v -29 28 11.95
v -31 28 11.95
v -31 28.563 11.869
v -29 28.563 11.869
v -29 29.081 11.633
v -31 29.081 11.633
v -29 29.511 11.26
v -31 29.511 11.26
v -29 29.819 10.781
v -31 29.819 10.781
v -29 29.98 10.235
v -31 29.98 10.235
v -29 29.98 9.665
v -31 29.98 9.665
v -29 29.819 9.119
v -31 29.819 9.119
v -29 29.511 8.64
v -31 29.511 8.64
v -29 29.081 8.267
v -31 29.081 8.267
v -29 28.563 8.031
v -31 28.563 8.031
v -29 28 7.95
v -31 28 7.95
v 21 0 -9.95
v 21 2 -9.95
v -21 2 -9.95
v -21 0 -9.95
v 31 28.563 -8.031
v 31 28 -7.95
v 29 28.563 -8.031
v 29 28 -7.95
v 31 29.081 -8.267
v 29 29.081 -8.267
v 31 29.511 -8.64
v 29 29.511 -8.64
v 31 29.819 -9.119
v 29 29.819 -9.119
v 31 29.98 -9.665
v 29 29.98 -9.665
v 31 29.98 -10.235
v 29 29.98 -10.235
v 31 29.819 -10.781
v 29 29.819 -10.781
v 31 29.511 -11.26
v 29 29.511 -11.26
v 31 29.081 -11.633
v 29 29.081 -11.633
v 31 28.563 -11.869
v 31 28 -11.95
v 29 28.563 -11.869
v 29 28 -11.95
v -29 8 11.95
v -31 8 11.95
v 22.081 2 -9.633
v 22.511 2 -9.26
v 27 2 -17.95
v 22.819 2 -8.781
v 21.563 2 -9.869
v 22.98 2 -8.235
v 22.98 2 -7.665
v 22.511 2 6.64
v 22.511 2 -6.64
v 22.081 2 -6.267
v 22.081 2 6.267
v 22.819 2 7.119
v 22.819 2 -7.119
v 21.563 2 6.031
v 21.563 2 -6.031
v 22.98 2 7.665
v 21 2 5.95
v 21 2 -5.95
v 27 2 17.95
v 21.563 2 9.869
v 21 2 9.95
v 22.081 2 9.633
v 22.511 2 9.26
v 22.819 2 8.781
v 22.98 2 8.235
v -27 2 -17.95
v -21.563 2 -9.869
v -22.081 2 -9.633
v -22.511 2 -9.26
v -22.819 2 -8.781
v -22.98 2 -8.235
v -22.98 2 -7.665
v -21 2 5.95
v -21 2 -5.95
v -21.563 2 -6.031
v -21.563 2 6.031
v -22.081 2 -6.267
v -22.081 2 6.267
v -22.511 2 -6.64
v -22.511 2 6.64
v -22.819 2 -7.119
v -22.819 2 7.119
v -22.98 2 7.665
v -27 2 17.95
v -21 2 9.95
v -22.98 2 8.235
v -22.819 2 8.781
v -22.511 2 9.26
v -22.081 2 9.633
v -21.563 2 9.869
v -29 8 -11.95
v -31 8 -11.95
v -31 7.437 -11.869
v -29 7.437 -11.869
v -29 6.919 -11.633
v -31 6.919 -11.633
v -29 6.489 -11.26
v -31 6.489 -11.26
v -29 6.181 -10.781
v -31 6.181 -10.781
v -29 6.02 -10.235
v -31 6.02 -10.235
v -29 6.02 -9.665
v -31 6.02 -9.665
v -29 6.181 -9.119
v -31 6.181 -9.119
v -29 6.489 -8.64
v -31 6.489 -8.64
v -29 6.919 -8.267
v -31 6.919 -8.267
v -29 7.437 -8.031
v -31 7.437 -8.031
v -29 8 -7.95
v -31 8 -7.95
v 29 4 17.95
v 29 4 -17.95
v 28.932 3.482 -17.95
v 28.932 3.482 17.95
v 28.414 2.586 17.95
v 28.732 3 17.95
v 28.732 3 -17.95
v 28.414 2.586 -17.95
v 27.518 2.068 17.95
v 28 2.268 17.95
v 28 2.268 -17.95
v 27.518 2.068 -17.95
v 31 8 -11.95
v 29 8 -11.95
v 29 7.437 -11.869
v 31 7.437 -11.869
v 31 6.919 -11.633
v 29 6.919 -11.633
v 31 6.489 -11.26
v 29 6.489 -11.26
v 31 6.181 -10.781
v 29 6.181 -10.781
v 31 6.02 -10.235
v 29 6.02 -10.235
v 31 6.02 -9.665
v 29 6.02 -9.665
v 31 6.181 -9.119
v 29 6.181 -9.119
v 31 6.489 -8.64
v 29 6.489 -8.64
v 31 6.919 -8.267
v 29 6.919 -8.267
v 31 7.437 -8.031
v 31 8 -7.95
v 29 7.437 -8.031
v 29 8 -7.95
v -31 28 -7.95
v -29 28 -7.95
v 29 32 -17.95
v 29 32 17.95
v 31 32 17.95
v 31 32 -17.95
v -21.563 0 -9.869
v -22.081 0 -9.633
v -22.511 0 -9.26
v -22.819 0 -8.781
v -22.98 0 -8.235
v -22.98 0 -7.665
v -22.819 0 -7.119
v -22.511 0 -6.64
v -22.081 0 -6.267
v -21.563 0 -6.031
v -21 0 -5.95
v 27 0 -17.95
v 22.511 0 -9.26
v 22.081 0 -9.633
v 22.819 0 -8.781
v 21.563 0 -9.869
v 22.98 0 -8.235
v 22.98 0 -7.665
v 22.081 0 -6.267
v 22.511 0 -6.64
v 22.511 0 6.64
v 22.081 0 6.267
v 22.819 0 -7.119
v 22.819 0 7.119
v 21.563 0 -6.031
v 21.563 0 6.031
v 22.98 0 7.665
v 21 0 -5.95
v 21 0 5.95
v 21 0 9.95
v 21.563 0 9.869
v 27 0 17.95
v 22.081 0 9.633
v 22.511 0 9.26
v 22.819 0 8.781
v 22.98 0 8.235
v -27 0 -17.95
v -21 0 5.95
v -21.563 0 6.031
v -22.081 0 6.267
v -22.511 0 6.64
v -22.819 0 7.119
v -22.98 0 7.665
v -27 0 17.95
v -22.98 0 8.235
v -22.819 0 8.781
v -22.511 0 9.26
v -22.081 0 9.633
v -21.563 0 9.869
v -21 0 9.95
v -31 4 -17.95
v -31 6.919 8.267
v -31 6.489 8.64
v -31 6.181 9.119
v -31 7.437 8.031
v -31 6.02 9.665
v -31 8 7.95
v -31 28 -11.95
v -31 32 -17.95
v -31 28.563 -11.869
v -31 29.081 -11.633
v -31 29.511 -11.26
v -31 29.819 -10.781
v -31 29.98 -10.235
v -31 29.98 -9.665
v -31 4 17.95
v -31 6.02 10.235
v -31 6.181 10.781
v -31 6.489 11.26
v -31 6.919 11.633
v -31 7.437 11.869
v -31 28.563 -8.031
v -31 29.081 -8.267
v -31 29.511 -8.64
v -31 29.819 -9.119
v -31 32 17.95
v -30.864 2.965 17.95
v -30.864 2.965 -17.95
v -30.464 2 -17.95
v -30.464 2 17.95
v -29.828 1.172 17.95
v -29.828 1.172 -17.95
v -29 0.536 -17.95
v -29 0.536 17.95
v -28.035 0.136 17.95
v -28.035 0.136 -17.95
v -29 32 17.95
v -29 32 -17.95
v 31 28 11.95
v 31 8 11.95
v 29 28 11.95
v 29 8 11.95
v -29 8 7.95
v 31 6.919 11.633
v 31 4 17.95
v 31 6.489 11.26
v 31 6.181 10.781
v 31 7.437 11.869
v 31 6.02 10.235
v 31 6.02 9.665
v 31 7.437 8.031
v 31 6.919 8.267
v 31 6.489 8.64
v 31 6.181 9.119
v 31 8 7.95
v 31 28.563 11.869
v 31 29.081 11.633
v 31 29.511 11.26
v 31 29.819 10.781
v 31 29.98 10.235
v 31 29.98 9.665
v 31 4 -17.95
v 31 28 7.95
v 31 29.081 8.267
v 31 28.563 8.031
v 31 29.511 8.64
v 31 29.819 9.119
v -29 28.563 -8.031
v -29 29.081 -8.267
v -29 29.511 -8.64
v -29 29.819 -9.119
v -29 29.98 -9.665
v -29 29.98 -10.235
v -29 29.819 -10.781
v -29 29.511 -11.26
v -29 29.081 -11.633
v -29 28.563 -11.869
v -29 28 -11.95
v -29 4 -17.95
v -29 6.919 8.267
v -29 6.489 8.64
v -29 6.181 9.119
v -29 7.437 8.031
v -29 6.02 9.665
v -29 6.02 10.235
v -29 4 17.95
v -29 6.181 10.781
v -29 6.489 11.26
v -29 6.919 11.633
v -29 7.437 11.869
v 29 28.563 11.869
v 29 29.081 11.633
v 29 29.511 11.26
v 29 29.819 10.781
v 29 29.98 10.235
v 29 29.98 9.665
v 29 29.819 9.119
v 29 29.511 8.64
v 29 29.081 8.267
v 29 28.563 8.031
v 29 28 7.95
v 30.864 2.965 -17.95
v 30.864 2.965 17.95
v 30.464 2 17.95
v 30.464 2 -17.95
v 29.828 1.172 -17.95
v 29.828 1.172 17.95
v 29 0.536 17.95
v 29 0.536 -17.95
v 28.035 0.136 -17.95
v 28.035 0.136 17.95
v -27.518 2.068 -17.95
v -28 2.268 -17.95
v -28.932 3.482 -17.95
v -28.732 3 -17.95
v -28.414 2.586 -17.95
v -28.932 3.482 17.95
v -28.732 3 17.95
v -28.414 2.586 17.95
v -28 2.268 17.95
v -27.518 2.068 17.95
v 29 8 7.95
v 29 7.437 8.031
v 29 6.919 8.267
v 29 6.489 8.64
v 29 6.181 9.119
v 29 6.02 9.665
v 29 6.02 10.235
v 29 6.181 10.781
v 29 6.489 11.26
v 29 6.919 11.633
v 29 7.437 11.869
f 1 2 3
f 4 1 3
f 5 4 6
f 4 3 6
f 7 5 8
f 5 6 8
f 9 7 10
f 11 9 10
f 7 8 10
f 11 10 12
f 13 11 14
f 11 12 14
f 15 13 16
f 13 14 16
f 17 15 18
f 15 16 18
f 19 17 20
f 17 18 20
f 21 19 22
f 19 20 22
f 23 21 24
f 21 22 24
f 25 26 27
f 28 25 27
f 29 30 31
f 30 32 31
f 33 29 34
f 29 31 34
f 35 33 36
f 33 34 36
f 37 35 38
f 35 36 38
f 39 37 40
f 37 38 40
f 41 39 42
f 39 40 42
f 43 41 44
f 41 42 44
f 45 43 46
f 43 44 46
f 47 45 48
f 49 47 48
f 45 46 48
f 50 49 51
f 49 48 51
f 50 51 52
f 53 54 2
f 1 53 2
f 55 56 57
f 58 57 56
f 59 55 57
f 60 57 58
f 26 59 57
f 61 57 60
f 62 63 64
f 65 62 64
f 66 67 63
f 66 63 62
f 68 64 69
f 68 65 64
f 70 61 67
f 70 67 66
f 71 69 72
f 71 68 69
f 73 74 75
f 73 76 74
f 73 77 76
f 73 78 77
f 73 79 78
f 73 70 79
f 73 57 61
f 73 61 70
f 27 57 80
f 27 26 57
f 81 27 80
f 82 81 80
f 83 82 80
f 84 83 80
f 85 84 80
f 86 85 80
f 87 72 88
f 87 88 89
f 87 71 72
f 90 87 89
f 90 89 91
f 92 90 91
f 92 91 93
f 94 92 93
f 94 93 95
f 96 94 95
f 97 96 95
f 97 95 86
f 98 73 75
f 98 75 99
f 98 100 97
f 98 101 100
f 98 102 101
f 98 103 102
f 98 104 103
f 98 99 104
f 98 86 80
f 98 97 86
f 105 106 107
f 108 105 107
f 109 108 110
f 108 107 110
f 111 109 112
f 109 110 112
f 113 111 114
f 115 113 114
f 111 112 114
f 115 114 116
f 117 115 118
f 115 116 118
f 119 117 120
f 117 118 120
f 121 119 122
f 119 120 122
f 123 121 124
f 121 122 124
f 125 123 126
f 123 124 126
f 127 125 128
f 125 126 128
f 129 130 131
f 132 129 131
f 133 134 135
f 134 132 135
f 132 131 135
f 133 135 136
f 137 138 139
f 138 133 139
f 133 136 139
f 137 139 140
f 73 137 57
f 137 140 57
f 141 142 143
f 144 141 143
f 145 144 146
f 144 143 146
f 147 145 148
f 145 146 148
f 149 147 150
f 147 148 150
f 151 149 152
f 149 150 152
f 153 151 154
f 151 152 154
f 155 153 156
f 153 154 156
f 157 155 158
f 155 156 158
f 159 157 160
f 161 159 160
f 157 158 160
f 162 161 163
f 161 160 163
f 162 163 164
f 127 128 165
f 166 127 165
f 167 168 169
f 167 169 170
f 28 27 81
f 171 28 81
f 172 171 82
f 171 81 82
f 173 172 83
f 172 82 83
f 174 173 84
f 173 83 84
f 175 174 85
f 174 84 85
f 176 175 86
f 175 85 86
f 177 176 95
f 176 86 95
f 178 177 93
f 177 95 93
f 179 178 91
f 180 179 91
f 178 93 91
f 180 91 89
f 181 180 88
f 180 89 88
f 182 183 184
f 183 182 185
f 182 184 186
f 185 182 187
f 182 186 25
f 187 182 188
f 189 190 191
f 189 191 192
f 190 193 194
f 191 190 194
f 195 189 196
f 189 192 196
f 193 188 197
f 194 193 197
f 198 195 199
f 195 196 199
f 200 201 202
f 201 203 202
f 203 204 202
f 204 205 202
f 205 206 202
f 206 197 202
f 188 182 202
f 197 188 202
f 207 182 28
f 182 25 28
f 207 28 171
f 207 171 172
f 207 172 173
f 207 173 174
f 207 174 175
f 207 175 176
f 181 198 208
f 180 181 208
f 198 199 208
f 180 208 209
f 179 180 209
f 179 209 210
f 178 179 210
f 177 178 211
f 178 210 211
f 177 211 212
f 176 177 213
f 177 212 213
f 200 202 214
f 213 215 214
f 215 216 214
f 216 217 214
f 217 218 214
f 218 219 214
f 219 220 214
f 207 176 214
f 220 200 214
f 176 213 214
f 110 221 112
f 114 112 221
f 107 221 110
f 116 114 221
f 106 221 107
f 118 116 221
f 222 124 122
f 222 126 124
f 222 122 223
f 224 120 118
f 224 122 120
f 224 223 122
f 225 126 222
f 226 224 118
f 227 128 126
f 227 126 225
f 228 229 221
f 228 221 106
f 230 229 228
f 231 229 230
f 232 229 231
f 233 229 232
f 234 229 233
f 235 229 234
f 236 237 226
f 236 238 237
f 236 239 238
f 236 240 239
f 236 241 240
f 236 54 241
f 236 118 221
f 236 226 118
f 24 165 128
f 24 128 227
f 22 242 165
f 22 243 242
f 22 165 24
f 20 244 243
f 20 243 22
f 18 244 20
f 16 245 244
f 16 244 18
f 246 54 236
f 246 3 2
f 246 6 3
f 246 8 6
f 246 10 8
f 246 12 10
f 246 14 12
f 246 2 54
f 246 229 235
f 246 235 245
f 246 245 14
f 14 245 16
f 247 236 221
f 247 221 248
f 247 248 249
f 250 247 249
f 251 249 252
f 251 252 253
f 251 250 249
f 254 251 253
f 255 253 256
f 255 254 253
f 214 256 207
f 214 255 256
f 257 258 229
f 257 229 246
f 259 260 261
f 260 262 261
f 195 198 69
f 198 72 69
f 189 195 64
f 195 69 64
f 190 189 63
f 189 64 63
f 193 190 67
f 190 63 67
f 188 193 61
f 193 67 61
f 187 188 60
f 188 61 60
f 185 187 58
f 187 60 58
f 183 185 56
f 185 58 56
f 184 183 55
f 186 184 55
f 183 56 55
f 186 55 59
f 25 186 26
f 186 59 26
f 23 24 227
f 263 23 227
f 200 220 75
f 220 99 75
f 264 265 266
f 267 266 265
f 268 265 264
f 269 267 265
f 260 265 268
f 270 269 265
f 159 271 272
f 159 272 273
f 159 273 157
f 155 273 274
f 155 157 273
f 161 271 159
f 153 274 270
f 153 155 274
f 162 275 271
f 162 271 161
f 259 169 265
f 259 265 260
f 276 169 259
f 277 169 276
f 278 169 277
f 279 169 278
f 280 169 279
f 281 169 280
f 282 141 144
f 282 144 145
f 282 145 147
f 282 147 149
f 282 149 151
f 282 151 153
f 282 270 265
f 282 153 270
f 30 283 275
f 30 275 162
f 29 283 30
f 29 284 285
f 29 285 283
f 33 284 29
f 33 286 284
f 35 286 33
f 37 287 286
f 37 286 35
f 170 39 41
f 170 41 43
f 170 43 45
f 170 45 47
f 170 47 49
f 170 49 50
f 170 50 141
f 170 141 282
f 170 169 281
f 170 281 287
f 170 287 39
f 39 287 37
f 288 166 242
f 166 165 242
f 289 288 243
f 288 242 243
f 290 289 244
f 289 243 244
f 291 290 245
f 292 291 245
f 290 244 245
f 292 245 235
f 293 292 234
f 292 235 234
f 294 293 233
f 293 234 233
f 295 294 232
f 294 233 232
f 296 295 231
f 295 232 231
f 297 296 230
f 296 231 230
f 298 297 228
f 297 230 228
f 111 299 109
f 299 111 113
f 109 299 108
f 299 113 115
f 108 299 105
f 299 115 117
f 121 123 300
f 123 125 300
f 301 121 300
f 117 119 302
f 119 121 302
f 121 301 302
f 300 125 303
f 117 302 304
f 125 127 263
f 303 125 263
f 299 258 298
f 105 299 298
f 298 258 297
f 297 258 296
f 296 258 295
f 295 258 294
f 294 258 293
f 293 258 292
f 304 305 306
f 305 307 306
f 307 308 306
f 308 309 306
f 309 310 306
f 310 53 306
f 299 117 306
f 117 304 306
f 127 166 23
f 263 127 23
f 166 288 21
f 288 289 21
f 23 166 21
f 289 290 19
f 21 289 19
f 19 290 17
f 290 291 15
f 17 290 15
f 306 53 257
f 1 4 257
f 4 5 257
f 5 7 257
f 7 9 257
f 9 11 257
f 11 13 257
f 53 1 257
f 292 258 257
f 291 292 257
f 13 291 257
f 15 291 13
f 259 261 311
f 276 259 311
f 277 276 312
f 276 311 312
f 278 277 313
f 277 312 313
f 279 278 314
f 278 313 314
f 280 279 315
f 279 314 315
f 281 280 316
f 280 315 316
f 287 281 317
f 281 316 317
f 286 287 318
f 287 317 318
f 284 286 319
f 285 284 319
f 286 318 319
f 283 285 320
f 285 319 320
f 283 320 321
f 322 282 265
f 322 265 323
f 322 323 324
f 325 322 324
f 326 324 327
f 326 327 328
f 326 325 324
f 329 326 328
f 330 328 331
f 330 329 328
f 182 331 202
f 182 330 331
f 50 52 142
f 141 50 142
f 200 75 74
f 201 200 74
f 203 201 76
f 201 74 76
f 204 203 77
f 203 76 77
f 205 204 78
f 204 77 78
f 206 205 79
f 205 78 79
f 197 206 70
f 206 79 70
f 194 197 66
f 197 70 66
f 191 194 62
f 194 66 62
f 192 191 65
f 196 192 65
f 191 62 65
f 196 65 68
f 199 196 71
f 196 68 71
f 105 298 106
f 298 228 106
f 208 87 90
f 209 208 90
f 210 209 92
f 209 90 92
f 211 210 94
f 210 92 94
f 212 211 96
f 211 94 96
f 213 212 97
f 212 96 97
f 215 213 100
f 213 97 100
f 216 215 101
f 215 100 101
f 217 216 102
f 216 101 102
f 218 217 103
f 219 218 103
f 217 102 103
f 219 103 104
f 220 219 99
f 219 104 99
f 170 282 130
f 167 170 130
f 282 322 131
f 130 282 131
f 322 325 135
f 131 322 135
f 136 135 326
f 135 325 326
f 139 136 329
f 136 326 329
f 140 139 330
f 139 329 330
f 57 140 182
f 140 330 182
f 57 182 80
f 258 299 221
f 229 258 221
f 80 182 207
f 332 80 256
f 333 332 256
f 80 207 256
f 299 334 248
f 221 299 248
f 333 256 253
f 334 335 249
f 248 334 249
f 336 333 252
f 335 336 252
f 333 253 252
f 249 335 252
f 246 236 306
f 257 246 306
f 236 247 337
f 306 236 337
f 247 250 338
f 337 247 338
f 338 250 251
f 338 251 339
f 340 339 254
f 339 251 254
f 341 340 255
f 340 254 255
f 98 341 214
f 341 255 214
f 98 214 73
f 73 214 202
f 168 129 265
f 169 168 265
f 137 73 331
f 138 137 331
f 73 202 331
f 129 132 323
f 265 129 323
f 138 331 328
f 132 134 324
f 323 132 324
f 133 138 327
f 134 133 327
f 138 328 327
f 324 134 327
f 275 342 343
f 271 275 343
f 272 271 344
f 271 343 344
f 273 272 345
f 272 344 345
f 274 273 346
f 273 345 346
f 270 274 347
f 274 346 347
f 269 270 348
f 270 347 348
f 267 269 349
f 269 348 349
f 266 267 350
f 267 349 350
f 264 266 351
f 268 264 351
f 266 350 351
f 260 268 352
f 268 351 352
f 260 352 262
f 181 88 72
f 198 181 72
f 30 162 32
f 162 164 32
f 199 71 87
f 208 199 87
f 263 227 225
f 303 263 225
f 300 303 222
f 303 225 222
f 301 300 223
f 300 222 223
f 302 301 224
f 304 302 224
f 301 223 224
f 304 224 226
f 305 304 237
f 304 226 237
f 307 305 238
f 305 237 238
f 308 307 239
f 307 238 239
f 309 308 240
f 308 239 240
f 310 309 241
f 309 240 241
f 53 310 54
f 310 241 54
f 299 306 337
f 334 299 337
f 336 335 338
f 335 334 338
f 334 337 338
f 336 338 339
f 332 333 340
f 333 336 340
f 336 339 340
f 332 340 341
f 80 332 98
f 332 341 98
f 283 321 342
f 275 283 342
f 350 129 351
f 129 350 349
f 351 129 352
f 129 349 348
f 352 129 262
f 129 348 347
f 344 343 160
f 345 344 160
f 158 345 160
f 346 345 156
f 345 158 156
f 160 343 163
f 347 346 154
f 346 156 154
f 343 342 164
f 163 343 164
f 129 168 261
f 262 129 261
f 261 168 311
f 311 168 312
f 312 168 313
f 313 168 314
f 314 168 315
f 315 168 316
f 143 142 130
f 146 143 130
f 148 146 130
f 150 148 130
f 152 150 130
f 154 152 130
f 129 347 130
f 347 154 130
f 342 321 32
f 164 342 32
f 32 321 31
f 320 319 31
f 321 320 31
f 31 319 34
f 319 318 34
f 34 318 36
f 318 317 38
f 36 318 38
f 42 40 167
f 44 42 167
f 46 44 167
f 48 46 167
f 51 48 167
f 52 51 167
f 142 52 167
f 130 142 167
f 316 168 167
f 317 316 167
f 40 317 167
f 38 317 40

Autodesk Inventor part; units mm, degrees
ref_plane "YZ Plane" through (0, 0, 0) normal (1, 0, 0) x (0, 1, 0)
ref_plane "XZ Plane" through (0, 0, 0) normal (0, 1, 0) x (-1, 0, 0)
ref_plane "XY Plane" through (0, 0, 0) normal (0, 0, 1) x (1, 0, 0)
sketch "スケッチ1" plane through (0, 0, 0) normal (0, 1, 0) x (-1, 0, 0)
  line L0 (-29, -17.95) -> (29, -17.95)
  line L1 (29, -17.95) -> (29, 17.95)
  line L2 (29, 17.95) -> (-29, 17.95)
  line L3 (-29, 17.95) -> (-29, -17.95)
  line L4 (-29, -17.95) -> (29, 17.95) construction
  line L5 (29, -17.95) -> (-29, 17.95) construction
  point P0 (0, 0)
  dimension "d0" = 35.9
  dimension "d1" = 58
extrude "プレート1" add sketch "スケッチ1" along normal blind 2
sketch "スケッチ2" plane through (29, 0, 17.95) normal (1, 0, 0) x (0, 0, -1)
  line L0 (0, 2) -> (35.9, 2)
  line L1 (35.9, 2) -> (0, 2)
  line L2 (0, 2) -> (0, 32)
  line L3 (0, 32) -> (35.9, 32)
  line L4 (35.9, 32) -> (35.9, 2)
  point P0 (17.95, 0)
  dimension "d3" = 30
sheet face with bend "面2" sketch "スケッチ2" thickness 2 toward (1, 0, 0) bend radius 2
bend "曲げ1"
sketch "スケッチ3" plane through (-29, 0, -17.95) normal (-1, 0, 0) x (0, 0, 1)
  line L0 (0, 0) -> (0, 2)
  line L1 (0, 32) -> (35.9, 32)
  line L2 (0, 2) -> (35.9, 2)
  line L3 (35.9, 2) -> (35.9, 32)
  line L4 (35.9, 32) -> (0, 32)
  line L5 (0, 32) -> (0, 2)
  point P0 (17.95, 0)
sheet face with bend "面3" sketch "スケッチ3" thickness 2 toward (-1, 0, 0) bend radius 2
bend "曲げ2"
sketch "スケッチ4" plane through (-31, 0, -17.95) normal (-1, 0, 0) x (0, 0, 1)
  line L0 (6, 28) -> (6, 8)
  arc A0 (6, 8) -> (10, 8) centre (8, 8) ccw
  line L1 (10, 8) -> (10, 28)
  arc A1 (10, 28) -> (6, 28) centre (8, 28) ccw
  line L2 (0, 32) -> (35.9, 32) projected
  line L3 (35.9, 4) -> (0, 4) projected
  line L4 (0, 4) -> (0, 32) projected
  line L5 (25.9, 28) -> (25.9, 8)
  arc A2 (25.9, 8) -> (29.9, 8) centre (27.9, 8) ccw
  line L6 (29.9, 8) -> (29.9, 28)
  arc A3 (29.9, 28) -> (25.9, 28) centre (27.9, 28) ccw
  line L7 (35.9, 32) -> (35.9, 4) projected
  point P0 (17.95, 0)
  dimension "d14" = 2
  dimension "d15" = 4
  dimension "d16" = 4
  dimension "d17" = 6
  dimension "d18" = 2
  dimension "d19" = 6
extrude "押し出し1" cut sketch "スケッチ4" against normal blind 100 contours A1 L1 A0 L0 | A3 L6 A2 L5
sketch "スケッチ5" plane through (0, 2, 0) normal (0, 1, 0) x (1, 0, 0)
  line L0 (-21, -9.95) -> (21, -9.95)
  arc A0 (21, -9.95) -> (21, -5.95) centre (21, -7.95) ccw
  line L1 (21, -5.95) -> (-21, -5.95)
  arc A1 (-21, -5.95) -> (-21, -9.95) centre (-21, -7.95) ccw
  line L2 (-21, 5.95) -> (21, 5.95)
  arc A2 (21, 5.95) -> (21, 9.95) centre (21, 7.95) ccw
  line L3 (21, 9.95) -> (-21, 9.95)
  arc A3 (-21, 9.95) -> (-21, 5.95) centre (-21, 7.95) ccw
  line L4 (-27, 17.95) -> (27, 17.95) projected
  line L5 (27, -17.95) -> (-27, -17.95) projected
  line L6 (-27, 17.95) -> (-27, -17.95) projected
  line L7 (27, -17.95) -> (27, 17.95) projected
  point P0 (0, 0)
  dimension "d22" = 2
  dimension "d23" = 2
  dimension "d25" = 10
  dimension "d26" = 10
  dimension "d27" = 6
  dimension "d28" = 6
  dimension "d29" = 6
  dimension "d30" = 6
extrude "押し出し2" cut sketch "スケッチ5" against normal blind 3 contours A1 L1 A0 L0 | A3 L3 A2 L2
equation "\"d2\" = Thickness"
equation "\"d4\" = BendRadius"
equation "\"d5\" = BendReliefWidth"
equation "\"d7\" = MinimumRemnant"
equation "\"d6\" = BendReliefDepth"
equation "\"d8\" = TransitionRadius"
equation "\"d9\" = BendRadius"
equation "\"d10\" = BendReliefWidth"
equation "\"d12\" = MinimumRemnant"
equation "\"d11\" = BendReliefDepth"
equation "\"d13\" = TransitionRadius"
equation "\"BendRadius\" = Thickness"
equation "\"BendReliefWidth\" = Thickness"
equation "\"BendReliefDepth\" = 0.5 * Thickness"
equation "\"CornerReliefSize\" = 4 * Thickness"
equation "\"MinimumRemnant\" = 2 * Thickness"
equation "\"TransitionRadius\" = BendRadius"
equation "\"JacobiRadiusSize\" = BendRadius"
equation "\"GapSize\" = Thickness"
equation "\"Thickness\" = 2"
properties part number "trackball_cup" material "アルミニウム 6061"
